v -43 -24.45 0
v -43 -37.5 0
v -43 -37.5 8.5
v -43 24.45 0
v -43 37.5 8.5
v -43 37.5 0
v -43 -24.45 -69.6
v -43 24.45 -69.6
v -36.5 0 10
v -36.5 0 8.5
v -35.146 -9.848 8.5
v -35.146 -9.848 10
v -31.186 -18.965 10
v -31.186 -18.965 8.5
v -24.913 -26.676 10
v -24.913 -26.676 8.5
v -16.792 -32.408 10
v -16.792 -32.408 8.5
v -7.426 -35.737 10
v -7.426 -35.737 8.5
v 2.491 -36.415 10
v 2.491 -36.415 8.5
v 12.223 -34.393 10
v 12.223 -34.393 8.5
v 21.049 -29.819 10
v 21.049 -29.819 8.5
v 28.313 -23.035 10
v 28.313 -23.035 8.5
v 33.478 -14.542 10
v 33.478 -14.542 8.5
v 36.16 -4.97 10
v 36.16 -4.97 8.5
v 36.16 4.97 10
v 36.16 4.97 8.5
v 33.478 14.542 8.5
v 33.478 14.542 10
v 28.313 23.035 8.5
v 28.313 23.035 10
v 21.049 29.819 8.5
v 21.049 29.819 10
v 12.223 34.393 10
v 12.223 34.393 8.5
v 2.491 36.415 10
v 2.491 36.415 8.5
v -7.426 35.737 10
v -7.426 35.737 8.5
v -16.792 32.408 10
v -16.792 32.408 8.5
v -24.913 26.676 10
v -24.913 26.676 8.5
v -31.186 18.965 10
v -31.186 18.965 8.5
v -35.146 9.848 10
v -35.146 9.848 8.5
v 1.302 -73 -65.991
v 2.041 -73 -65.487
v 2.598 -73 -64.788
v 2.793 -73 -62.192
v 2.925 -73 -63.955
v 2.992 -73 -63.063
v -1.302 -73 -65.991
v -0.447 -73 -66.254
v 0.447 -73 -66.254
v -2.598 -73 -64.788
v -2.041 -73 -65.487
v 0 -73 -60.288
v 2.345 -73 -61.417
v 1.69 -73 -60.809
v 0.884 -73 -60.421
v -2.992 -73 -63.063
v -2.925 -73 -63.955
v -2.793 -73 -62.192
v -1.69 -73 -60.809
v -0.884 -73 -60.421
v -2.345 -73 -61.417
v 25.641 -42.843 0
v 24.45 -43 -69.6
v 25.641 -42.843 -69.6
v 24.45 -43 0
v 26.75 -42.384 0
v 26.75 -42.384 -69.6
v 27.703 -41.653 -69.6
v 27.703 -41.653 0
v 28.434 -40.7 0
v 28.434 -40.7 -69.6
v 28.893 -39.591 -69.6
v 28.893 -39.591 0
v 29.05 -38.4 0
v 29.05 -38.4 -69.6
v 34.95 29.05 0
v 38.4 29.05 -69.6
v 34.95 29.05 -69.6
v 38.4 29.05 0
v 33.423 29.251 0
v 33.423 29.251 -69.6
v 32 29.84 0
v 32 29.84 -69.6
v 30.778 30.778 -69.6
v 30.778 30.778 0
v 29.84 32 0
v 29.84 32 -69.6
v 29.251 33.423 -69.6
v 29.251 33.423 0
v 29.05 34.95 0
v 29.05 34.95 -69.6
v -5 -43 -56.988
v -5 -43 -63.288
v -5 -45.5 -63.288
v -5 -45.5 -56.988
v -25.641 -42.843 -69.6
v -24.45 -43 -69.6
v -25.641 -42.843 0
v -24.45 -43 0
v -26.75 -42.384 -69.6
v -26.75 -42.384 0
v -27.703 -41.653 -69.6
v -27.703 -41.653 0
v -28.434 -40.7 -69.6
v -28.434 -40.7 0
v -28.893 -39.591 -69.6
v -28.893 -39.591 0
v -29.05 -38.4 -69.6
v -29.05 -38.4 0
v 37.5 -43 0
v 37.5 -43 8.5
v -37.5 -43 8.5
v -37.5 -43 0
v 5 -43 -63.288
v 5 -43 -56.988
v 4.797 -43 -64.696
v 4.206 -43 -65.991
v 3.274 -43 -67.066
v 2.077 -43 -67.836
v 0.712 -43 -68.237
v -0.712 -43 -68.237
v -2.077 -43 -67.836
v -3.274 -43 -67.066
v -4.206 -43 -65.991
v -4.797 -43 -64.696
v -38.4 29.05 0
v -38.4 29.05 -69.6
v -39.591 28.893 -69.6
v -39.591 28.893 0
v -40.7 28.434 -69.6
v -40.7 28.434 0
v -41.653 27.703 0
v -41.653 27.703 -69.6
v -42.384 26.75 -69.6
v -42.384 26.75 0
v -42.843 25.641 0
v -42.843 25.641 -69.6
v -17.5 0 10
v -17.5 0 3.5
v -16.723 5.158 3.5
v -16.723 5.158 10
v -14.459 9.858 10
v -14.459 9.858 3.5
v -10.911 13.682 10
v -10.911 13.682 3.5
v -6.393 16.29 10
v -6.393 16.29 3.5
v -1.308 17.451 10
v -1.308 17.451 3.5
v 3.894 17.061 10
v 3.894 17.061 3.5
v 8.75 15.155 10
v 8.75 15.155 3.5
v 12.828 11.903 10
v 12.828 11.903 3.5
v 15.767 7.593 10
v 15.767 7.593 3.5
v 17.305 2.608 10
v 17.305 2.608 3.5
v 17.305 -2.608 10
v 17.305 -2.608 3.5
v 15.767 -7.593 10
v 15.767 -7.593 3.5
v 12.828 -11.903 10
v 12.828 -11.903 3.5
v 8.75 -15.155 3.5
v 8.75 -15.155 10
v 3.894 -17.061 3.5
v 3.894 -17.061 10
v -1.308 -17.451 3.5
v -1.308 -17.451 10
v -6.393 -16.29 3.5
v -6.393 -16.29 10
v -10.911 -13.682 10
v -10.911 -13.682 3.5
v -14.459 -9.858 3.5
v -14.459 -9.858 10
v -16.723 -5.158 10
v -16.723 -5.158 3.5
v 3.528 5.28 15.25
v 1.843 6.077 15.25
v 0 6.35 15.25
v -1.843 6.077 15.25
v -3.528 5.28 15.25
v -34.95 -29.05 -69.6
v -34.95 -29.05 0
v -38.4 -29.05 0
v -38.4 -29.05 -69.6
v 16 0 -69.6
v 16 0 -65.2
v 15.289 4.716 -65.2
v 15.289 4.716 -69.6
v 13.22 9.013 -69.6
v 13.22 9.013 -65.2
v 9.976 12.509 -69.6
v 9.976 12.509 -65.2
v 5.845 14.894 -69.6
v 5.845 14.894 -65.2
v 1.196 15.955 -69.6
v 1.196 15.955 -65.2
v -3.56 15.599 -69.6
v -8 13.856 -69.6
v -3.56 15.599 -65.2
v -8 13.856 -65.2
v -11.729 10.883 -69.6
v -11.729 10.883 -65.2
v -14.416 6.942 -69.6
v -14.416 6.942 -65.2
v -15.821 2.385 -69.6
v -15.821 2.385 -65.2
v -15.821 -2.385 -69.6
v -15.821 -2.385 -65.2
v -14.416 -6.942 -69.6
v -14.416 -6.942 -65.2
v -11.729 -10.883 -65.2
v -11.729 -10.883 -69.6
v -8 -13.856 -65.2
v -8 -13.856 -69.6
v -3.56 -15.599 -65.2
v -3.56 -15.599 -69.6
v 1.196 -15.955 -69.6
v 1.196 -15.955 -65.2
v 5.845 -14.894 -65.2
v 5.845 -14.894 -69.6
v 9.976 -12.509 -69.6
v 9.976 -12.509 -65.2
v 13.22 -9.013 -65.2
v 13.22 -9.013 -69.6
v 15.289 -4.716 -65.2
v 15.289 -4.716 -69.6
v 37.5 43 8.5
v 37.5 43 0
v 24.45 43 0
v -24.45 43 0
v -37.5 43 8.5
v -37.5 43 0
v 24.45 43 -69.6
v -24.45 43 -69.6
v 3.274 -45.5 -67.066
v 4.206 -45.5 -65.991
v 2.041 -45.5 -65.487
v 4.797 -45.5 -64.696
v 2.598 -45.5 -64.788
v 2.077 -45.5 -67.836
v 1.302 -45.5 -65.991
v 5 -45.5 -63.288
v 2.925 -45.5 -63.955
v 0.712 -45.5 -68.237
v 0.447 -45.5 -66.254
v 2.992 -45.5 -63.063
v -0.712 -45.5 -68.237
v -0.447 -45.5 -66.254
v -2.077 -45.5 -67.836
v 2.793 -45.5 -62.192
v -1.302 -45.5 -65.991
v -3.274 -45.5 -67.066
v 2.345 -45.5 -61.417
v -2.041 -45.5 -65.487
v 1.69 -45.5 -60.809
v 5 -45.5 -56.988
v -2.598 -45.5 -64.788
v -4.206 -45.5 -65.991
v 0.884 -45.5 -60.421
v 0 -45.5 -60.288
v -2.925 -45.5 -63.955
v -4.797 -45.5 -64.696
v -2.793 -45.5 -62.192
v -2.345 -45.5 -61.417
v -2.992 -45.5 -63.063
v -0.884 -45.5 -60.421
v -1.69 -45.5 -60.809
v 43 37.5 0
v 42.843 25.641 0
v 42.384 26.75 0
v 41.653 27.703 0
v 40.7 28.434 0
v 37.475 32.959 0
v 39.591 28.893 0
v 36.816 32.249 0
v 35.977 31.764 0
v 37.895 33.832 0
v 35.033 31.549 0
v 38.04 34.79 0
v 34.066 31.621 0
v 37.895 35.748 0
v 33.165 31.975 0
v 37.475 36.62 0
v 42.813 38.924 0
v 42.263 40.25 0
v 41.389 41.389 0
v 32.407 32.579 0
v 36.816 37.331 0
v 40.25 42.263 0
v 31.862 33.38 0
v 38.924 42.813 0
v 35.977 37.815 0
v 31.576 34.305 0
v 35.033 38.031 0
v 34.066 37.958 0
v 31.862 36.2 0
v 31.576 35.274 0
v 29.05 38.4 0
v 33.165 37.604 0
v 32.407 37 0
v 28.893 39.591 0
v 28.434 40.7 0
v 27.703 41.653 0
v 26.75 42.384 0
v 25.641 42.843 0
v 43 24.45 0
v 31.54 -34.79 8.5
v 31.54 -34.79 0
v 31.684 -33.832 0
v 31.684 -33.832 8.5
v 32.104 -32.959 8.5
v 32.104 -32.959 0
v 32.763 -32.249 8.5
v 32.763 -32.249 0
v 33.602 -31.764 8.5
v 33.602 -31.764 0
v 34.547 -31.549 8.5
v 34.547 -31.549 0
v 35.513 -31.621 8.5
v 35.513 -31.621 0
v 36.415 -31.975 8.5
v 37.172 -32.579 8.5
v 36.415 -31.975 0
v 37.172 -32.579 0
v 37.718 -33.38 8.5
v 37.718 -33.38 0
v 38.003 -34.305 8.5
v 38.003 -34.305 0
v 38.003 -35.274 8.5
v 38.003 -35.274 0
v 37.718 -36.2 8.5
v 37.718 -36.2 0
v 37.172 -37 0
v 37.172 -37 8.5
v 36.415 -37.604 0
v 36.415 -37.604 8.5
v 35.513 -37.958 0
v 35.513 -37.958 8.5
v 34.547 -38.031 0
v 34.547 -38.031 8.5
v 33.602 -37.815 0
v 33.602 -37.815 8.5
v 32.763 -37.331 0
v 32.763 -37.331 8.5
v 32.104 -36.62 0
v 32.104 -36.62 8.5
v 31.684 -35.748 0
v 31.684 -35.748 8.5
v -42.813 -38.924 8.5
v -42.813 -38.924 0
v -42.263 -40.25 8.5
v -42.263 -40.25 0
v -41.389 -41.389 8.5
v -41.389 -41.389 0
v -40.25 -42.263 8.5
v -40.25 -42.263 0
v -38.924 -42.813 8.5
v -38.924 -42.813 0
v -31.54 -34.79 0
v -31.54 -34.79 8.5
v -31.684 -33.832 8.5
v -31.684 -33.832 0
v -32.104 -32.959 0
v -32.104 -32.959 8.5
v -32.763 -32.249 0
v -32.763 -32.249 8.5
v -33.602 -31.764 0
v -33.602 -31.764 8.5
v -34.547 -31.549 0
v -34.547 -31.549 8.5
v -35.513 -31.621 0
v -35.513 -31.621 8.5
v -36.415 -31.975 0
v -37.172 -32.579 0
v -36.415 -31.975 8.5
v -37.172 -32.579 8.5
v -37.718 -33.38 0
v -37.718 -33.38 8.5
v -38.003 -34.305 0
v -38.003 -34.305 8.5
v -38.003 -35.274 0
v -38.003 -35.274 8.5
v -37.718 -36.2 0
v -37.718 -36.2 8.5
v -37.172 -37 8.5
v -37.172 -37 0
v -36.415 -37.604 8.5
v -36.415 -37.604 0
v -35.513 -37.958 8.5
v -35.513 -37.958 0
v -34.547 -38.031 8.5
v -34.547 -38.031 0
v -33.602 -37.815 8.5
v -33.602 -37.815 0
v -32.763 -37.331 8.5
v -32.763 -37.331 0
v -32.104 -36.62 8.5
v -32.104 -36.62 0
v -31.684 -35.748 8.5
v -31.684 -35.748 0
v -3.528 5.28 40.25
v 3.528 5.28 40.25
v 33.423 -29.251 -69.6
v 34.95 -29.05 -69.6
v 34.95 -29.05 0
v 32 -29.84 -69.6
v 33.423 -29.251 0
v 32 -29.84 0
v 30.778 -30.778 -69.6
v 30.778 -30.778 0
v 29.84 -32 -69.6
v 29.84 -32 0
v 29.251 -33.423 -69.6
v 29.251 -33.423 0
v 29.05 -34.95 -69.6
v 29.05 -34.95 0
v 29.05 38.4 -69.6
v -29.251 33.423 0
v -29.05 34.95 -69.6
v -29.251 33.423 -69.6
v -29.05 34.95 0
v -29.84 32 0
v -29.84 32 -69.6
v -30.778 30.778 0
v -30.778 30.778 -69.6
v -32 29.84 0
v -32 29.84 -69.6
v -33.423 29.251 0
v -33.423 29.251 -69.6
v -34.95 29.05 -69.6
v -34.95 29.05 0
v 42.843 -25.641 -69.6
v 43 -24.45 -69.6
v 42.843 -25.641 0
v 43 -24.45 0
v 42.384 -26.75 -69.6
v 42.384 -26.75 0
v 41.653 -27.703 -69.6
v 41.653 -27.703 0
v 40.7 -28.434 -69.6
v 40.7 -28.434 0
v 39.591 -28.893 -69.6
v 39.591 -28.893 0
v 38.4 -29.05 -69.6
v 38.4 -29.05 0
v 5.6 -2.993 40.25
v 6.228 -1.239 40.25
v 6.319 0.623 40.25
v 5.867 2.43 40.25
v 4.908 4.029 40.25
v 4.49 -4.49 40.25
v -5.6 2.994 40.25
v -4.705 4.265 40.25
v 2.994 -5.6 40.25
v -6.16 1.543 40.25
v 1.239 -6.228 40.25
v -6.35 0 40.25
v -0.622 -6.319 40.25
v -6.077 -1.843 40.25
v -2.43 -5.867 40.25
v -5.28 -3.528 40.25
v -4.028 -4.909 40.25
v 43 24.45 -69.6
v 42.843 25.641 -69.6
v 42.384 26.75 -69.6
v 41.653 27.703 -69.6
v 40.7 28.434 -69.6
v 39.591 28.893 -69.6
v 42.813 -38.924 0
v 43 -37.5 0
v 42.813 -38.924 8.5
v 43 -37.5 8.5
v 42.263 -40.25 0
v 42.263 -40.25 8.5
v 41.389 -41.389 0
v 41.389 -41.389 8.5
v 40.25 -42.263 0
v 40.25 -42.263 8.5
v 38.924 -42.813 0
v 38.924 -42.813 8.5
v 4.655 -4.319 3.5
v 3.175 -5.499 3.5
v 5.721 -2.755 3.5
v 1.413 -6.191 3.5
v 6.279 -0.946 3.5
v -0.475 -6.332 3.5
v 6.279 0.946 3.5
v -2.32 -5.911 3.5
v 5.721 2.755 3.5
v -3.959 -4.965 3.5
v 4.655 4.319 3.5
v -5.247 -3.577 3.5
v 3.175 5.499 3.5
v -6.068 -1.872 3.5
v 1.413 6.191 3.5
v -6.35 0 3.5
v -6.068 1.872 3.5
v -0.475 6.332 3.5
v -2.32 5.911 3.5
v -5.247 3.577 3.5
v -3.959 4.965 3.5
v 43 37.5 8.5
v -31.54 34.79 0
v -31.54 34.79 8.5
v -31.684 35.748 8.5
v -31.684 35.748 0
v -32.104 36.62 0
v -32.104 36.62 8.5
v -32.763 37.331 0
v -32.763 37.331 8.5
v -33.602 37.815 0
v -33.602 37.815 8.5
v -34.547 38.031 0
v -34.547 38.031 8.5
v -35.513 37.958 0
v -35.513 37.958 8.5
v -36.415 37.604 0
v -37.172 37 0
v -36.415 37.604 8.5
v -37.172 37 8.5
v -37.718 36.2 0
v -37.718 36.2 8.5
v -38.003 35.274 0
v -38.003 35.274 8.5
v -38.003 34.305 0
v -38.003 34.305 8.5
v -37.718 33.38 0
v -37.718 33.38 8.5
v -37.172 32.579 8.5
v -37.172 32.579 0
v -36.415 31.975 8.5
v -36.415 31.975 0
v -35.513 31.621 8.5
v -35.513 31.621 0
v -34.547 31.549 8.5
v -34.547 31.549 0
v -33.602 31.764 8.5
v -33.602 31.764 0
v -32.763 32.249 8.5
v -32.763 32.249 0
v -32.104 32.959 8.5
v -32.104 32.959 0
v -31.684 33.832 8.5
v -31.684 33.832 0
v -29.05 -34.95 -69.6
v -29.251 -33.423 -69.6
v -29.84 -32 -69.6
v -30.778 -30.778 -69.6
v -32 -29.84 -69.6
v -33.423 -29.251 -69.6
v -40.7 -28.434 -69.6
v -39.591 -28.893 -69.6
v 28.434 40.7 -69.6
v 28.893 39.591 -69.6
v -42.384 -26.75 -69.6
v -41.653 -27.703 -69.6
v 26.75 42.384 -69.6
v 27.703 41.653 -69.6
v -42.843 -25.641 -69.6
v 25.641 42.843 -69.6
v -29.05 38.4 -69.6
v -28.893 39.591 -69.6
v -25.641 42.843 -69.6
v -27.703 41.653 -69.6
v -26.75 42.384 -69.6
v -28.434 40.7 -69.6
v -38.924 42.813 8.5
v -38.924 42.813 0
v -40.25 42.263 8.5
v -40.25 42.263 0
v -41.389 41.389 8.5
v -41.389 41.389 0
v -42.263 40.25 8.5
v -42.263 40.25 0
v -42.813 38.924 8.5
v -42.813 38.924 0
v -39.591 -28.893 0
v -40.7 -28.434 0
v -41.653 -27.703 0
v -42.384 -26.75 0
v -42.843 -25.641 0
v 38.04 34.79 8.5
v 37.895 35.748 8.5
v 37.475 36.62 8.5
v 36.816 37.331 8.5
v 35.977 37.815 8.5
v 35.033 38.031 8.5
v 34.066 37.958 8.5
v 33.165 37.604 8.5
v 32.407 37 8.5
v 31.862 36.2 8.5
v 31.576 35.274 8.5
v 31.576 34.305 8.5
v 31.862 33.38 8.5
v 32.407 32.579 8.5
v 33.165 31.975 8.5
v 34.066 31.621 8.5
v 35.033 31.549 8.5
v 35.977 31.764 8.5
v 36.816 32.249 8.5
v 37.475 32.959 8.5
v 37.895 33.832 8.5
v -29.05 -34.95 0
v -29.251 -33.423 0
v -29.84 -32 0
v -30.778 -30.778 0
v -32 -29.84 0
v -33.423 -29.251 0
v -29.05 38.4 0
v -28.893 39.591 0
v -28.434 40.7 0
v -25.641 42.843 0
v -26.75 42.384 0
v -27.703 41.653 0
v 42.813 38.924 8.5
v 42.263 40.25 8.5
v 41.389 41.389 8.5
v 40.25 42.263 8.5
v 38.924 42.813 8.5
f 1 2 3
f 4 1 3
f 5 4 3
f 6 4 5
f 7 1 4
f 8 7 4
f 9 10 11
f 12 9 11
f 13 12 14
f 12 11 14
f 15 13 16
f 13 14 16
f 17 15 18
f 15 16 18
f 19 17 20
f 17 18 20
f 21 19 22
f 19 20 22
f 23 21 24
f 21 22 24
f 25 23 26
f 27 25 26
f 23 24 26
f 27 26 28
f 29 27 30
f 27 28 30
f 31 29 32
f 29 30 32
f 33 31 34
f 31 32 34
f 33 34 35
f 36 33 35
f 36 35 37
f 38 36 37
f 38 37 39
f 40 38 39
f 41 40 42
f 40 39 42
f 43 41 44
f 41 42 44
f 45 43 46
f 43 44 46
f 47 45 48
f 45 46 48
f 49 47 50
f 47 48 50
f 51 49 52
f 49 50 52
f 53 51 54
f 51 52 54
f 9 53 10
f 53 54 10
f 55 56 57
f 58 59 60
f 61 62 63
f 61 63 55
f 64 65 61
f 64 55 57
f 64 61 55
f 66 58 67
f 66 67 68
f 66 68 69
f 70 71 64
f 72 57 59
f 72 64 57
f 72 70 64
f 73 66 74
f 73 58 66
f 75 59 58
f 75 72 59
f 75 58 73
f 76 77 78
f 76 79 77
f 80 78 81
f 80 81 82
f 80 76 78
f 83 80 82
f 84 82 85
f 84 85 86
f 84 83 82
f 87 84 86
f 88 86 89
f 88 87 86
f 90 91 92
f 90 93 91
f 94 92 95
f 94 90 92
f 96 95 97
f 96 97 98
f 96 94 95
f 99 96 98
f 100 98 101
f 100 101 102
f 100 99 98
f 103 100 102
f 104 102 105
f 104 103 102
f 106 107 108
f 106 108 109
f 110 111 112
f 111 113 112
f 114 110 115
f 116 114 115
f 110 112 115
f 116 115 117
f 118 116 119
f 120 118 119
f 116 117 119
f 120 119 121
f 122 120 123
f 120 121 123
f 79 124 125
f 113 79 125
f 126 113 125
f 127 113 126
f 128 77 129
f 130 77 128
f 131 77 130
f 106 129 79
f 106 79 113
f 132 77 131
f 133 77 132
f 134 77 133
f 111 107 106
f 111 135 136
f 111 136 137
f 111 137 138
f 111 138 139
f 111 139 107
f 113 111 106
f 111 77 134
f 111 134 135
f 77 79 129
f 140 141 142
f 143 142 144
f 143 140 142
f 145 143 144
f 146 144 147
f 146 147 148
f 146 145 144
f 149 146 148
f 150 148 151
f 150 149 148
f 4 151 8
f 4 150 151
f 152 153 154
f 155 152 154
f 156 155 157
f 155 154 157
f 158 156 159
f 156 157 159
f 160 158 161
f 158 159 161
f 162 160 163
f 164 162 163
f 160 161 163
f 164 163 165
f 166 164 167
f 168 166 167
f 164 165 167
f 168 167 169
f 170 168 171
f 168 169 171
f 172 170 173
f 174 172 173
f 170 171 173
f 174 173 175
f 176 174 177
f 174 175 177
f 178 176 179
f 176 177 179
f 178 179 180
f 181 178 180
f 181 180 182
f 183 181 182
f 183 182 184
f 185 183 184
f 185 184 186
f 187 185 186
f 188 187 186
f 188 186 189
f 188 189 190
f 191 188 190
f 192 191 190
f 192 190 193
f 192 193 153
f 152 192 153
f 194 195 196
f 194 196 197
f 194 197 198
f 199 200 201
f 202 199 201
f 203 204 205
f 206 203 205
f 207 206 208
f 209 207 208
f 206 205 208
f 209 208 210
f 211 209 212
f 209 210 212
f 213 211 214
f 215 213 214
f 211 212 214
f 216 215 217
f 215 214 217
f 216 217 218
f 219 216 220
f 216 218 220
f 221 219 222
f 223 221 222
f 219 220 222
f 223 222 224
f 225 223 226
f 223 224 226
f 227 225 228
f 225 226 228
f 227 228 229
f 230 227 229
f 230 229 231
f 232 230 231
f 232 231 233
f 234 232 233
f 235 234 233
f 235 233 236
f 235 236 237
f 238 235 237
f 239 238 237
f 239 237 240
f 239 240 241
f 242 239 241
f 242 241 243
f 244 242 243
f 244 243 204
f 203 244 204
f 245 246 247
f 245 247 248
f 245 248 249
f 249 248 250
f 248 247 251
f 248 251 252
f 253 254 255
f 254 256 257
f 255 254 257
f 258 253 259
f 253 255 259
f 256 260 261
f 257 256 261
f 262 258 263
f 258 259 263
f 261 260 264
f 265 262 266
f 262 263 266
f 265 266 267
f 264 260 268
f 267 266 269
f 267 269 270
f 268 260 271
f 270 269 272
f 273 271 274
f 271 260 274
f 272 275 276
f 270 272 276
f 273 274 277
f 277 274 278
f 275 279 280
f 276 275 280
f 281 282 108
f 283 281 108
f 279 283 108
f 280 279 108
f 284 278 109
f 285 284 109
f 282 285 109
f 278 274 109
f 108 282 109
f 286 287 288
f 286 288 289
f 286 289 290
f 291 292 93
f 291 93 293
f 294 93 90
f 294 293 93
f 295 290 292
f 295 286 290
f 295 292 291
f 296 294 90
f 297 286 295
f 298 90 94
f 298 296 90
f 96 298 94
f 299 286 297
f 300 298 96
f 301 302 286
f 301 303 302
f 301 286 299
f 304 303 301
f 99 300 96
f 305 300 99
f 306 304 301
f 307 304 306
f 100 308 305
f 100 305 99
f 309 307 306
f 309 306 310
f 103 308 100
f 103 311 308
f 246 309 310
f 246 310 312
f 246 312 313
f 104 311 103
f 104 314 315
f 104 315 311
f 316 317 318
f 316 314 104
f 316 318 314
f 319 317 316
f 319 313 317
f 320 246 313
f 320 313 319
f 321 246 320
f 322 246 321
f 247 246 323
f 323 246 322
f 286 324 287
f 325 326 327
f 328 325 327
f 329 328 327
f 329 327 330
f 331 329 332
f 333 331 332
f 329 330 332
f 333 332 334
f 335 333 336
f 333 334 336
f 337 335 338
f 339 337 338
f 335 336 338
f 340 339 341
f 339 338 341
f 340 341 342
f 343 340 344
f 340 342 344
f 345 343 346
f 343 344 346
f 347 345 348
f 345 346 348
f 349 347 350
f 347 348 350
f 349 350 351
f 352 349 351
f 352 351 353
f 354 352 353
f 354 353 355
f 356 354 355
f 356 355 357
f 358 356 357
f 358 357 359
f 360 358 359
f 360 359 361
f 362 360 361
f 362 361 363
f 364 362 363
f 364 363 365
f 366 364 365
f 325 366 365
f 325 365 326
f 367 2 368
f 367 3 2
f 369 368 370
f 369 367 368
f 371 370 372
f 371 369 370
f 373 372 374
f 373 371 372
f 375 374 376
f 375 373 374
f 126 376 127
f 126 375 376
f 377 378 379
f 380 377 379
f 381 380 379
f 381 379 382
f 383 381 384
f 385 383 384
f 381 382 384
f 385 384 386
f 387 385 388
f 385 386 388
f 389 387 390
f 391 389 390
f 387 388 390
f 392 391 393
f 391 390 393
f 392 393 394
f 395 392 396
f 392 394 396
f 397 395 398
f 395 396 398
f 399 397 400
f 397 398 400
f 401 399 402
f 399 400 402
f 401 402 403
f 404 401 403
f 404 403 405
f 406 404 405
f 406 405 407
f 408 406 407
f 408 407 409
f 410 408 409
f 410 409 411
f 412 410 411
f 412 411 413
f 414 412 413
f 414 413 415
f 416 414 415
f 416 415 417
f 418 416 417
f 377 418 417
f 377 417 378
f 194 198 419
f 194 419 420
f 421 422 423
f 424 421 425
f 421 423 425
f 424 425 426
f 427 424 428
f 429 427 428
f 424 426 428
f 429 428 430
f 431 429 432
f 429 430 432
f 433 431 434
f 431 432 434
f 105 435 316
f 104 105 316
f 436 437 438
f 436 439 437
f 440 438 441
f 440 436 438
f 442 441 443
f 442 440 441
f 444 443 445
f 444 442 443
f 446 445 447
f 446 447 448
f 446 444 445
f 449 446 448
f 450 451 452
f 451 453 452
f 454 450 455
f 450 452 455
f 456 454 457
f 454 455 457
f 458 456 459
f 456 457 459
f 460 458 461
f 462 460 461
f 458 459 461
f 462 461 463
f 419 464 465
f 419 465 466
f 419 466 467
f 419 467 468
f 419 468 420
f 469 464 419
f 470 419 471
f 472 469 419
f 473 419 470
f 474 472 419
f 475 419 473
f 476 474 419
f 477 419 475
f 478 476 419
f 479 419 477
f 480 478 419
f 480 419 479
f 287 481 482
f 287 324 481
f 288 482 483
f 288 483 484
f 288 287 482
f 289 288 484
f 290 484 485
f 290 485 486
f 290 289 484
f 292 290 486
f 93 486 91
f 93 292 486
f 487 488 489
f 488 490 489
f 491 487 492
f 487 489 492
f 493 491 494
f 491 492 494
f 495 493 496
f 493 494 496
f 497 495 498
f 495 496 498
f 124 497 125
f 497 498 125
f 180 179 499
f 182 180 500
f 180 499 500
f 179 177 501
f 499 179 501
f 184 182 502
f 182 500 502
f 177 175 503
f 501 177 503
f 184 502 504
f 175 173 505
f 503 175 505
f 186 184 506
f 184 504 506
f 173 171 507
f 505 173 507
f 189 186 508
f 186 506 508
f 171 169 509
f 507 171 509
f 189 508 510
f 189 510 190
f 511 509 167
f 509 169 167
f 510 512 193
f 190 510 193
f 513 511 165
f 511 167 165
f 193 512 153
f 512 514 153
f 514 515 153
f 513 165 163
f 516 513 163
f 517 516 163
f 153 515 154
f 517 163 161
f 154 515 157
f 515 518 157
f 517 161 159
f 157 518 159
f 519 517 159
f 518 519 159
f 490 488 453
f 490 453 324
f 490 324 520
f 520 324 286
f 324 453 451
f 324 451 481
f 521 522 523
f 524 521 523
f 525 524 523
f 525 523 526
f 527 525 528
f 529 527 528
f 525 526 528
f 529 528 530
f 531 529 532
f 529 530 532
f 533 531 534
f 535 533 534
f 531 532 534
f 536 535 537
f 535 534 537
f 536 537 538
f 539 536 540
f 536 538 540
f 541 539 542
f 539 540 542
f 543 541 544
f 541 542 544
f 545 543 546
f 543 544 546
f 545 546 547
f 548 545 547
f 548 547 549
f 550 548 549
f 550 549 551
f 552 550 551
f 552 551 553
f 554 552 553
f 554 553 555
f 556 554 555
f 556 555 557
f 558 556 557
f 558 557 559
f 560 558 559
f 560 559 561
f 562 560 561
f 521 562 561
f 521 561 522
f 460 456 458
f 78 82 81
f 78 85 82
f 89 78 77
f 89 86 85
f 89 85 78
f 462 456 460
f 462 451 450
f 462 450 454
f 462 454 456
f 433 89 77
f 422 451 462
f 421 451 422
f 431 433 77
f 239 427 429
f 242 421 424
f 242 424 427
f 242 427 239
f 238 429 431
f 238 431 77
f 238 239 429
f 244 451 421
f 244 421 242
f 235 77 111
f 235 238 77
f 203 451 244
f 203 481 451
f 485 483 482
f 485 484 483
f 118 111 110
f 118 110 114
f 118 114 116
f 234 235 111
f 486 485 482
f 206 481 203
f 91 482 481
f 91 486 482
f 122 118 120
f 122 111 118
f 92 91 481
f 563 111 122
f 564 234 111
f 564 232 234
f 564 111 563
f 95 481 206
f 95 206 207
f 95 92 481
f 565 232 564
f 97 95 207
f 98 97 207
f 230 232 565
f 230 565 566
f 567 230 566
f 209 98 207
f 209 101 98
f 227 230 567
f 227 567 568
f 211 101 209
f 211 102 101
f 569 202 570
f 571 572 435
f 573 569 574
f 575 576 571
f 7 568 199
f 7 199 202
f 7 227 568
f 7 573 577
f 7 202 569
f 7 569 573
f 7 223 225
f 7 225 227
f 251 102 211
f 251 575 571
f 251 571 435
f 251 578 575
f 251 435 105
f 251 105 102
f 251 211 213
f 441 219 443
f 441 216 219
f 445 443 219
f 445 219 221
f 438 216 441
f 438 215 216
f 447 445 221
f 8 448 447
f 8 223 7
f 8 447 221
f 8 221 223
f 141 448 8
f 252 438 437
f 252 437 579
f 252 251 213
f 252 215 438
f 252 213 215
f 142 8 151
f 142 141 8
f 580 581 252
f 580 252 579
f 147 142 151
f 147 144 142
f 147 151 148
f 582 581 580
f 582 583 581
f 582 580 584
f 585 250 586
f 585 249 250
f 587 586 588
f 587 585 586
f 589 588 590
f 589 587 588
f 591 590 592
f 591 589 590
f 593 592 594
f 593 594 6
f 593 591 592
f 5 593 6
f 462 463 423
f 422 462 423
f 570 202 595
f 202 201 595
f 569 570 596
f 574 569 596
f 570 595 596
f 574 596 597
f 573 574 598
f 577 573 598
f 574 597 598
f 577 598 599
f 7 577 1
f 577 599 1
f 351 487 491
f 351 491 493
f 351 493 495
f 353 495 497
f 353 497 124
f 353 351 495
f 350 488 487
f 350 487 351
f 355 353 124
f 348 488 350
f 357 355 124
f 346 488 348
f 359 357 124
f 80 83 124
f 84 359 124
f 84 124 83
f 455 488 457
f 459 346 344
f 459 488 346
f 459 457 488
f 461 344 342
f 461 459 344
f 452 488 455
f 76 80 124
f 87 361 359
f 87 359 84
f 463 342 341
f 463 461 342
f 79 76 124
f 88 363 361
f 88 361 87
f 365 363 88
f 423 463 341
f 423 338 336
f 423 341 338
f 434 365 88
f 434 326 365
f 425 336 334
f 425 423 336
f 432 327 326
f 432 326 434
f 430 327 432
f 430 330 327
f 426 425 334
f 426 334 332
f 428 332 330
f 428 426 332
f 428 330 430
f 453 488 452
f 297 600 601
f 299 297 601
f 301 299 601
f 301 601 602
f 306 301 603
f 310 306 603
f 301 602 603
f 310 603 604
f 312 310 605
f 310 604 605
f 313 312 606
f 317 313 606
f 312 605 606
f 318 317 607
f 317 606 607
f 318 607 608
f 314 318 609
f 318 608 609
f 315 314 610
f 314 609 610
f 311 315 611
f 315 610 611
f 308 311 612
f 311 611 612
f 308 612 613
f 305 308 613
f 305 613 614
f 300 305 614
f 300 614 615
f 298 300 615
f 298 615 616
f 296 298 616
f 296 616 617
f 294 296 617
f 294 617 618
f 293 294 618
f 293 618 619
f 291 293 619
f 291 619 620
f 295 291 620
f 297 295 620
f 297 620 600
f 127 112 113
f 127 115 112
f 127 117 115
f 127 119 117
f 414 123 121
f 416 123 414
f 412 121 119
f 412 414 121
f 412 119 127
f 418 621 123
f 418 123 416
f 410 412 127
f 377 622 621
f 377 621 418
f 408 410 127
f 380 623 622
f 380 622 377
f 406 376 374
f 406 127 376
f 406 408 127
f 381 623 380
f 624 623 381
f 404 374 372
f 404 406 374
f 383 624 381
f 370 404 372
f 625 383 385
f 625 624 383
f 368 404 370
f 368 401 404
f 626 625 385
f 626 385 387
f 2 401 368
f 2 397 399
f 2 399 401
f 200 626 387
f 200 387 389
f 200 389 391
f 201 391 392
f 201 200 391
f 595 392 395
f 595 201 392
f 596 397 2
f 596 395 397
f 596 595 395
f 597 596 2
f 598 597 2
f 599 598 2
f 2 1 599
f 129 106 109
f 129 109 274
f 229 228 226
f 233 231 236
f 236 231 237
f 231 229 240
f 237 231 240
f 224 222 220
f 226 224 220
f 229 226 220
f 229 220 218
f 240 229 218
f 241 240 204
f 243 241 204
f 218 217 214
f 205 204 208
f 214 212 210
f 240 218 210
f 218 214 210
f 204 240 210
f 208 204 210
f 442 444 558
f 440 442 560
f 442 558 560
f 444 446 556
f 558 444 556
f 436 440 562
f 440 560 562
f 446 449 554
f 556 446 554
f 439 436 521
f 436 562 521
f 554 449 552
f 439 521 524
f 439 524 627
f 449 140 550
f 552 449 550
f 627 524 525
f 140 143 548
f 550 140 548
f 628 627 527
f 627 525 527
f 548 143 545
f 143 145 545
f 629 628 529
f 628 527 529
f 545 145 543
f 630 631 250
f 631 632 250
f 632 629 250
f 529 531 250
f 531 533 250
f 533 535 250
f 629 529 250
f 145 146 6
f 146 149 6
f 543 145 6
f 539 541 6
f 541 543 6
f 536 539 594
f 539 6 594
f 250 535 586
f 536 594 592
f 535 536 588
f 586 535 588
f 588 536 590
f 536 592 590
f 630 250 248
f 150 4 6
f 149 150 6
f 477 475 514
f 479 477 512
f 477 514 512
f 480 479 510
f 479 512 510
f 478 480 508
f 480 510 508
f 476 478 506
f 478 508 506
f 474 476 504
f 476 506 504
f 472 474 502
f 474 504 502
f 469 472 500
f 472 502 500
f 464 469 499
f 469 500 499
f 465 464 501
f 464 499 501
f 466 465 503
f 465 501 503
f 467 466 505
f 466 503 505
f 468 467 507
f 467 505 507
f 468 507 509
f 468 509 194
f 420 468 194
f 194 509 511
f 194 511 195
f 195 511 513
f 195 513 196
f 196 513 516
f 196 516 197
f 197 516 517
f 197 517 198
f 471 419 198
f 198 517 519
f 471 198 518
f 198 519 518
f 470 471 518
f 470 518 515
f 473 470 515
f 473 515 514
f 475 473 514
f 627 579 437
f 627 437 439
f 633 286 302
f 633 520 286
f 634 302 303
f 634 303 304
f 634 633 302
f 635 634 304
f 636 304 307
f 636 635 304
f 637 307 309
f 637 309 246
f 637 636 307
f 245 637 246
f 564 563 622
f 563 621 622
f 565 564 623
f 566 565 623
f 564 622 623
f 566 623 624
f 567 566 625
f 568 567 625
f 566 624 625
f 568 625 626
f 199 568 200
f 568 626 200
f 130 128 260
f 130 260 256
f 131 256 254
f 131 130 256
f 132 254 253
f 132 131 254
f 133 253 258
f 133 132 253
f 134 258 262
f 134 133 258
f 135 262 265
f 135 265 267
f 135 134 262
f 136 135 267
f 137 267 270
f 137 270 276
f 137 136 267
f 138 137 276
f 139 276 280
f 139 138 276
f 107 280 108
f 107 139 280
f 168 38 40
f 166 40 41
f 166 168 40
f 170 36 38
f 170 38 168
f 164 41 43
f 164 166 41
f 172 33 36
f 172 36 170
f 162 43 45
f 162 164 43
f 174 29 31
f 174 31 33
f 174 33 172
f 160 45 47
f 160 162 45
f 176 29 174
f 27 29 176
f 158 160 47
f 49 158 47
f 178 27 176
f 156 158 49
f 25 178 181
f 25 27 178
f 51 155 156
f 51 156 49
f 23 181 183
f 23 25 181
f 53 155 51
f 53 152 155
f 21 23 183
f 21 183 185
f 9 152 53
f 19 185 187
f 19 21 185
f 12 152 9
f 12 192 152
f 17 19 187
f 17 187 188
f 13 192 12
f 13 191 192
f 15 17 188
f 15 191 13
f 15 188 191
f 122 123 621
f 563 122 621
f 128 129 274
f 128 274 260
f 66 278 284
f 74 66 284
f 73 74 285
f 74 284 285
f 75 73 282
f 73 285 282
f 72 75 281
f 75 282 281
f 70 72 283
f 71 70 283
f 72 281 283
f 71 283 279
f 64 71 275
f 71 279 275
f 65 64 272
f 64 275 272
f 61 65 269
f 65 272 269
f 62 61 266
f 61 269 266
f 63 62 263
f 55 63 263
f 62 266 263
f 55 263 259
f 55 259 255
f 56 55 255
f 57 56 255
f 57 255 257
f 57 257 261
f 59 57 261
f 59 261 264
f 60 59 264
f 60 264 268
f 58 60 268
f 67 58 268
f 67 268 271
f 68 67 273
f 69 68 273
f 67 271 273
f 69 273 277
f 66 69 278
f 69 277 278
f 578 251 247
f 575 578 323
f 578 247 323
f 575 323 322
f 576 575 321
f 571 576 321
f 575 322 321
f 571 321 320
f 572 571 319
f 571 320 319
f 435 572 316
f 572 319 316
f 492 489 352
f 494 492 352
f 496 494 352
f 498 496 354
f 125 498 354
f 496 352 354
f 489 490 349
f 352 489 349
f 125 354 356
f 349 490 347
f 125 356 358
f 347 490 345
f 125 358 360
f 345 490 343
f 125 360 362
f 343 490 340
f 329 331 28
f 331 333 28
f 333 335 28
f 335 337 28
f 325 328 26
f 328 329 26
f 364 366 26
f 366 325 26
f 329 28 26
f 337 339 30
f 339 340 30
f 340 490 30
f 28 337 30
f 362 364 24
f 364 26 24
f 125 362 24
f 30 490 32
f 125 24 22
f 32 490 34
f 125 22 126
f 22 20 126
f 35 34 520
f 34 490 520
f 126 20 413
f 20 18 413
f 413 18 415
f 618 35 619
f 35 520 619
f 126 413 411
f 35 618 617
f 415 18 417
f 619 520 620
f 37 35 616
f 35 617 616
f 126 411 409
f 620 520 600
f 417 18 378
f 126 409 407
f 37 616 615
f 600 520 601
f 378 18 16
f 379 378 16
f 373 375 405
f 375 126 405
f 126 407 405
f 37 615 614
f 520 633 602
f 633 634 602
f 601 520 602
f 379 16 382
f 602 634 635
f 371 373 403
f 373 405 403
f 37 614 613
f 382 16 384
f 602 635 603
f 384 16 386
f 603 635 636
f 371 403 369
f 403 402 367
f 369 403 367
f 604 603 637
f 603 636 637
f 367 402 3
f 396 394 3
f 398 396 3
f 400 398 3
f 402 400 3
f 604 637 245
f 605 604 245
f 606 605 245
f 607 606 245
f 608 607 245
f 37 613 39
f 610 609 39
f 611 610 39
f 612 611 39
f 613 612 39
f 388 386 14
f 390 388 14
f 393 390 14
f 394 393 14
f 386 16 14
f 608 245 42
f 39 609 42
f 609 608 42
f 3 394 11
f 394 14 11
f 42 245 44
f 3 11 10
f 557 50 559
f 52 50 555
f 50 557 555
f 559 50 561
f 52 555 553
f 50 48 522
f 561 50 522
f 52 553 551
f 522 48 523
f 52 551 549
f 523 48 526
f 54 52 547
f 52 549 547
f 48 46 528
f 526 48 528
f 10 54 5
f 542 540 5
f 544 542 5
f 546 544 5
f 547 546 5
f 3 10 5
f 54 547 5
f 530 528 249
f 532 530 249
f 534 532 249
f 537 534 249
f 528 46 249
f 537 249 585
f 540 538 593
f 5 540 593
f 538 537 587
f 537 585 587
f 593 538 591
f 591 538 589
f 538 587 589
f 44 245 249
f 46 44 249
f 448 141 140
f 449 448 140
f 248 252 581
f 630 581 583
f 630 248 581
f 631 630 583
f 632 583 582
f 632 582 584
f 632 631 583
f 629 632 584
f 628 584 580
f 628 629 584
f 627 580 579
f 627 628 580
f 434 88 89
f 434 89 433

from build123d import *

# Parameters (mm, degrees)
SKETCH_1_W                  = 86
SKETCH_1_H                  = 86
EXTRUDE_1_DEPTH             = 78.1
SKETCH_2_R                  = 36.5
EXTRUDE_2_DEPTH             = 1.5
HOLE_WIZARD_M30_1_D         = 35
HOLE_WIZARD_M30_1_DEPTH     = 6.5
SKETCH_5_R                  = 6.35
EXTRUDE_3_DEPTH             = 36.75
CUT_EXTRUDE_START           = -25
CUT_EXTRUDE_1_DEPTH         = 25
SKETCH_7_W                  = 69.6
SKETCH_7_H                  = 13.95
CUT_EXTRUDE_2_DEPTH         = 13.95
SKETCH_8_W                  = 13.95
SKETCH_8_H                  = 69.6
CUT_EXTRUDE_3_DEPTH         = 13.95
SKETCH_9_W                  = 13.95
SKETCH_9_H                  = 13.95
CUT_EXTRUDE_4_DEPTH         = 69.6
SKETCH_10_W                 = 13.95
SKETCH_10_H                 = 13.95
CUT_EXTRUDE_5_DEPTH         = 69.6
EXTRUDE_4_DEPTH             = 2.5
SKETCH_12_R                 = 3
EXTRUDE_5_DEPTH             = 27.5
HOLE_WIZARD_6_5_6_5_1_D     = 6.5
HOLE_WIZARD_6_5_6_5_1_DEPTH = 78.1
HOLE_WIZARD_6_5_6_5_2_D     = 6.5
HOLE_WIZARD_6_5_6_5_2_DEPTH = 40.25
HOLE_WIZARD_M27_1_D         = 32
HOLE_WIZARD_M27_1_DEPTH     = 4.4
FILLET_1_R                  = 4.6
FILLET_2_R                  = 5.5
FILLET_3_R                  = 5.9


with BuildPart() as part:
    # 草图1 → 凸台-拉伸1 (new body)
    with BuildSketch(Plane(origin=(0, 0, -69.6), x_dir=(-1, 0, 0), z_dir=(0, 0, -1))):
        Rectangle(SKETCH_1_W, SKETCH_1_H)
    extrude(amount=-EXTRUDE_1_DEPTH)

    # 草图2 → 凸台-拉伸2 (add)
    with BuildSketch(Plane.XY.offset(8.5)):
        with Locations(Location((0, 0, 0), (0, 0, 180))):
            Circle(SKETCH_2_R)
    extrude(amount=EXTRUDE_2_DEPTH)

    # M30 间隙孔1
    with Locations(Plane.XY.offset(10)):
        with Locations((0, 0)):
            Hole(HOLE_WIZARD_M30_1_D / 2, depth=HOLE_WIZARD_M30_1_DEPTH)

    # 草图5 → 凸台-拉伸3 (add)
    with BuildSketch(Plane.XY.offset(3.5)):
        with Locations(Location((0, 0, 0), (0, 0, 180))):
            Circle(SKETCH_5_R)
    extrude(amount=EXTRUDE_3_DEPTH)

    # 草图6 → 切除-拉伸1 (cut)
    with BuildSketch(Plane.XY.offset(40.25).offset(CUT_EXTRUDE_START)):
        with BuildLine():
            Line((-3.527619594, 5.28), (3.527619595, 5.28))
            ThreePointArc((3.527619595, 5.28), (1e-09, 6.35), (-3.527619594, 5.28))
        make_face()
    extrude(amount=CUT_EXTRUDE_1_DEPTH, mode=Mode.SUBTRACT)

    # 草图7 → 切除-拉伸2 (cut)
    with BuildSketch(Plane.ZY.offset(43)):
        with Locations((-34.8, 36.025)):
            Rectangle(SKETCH_7_W, SKETCH_7_H)
    extrude(amount=-CUT_EXTRUDE_2_DEPTH, mode=Mode.SUBTRACT)

    # 草图8 → 切除-拉伸3 (cut)
    with BuildSketch(Plane(origin=(0, 43, 0), x_dir=(-1, 0, 0), z_dir=(0, 1, 0))):
        with Locations((-36.025, -34.8)):
            Rectangle(SKETCH_8_W, SKETCH_8_H)
    extrude(amount=-CUT_EXTRUDE_3_DEPTH, mode=Mode.SUBTRACT)

    # 草图9 → 切除-拉伸4 (cut)
    with BuildSketch(Plane(origin=(0, 0, -69.6), x_dir=(-1, 0, 0), z_dir=(0, 0, -1))):
        with Locations((36.025, -36.025)):
            Rectangle(SKETCH_9_W, SKETCH_9_H)
    extrude(amount=-CUT_EXTRUDE_4_DEPTH, mode=Mode.SUBTRACT)

    # 草图10 → 切除-拉伸5 (cut)
    with BuildSketch(Plane(origin=(0, 0, -69.6), x_dir=(-1, 0, 0), z_dir=(0, 0, -1))):
        with Locations((-36.025, -36.025)):
            Rectangle(SKETCH_10_W, SKETCH_10_H)
    extrude(amount=-CUT_EXTRUDE_5_DEPTH, mode=Mode.SUBTRACT)

    # 草图11 → 凸台-拉伸4 (add)
    with BuildSketch(Plane.XZ.offset(43)):
        with BuildLine():
            Line((-5, -56.987641526), (5, -56.987641526))
            Line((5, -56.987641526), (5, -63.287641526))
            ThreePointArc((5, -63.287641526), (0, -68.287641526), (-5, -63.287641526))
            Line((-5, -63.287641526), (-5, -56.987641526))
        make_face()
    extrude(amount=EXTRUDE_4_DEPTH)

    # 草图12 → 凸台-拉伸5 (add)
    with BuildSketch(Plane.XZ.offset(45.5)):
        with Locations(Location((0, -63.287641526, 0), (0, 0, 90))):
            Circle(SKETCH_12_R)
    extrude(amount=EXTRUDE_5_DEPTH)

    # Ø6.5 (6.5) 直径孔1
    with Locations(Plane.XY.offset(8.5)):
        with Locations((34.789653634, -34.789653634)):
            Hole(HOLE_WIZARD_6_5_6_5_1_D / 2, depth=HOLE_WIZARD_6_5_6_5_1_DEPTH)

    # Ø6.5 (6.5) 直径孔2
    with Locations(Plane(origin=(0, 0, 0), x_dir=(-1, 0, 0), z_dir=(0, 0, -1))):
        with Locations((34.789653634, -34.789653634), (-34.789653634, 34.789653634), (34.789653634, 34.789653634)):
            Hole(HOLE_WIZARD_6_5_6_5_2_D / 2, depth=HOLE_WIZARD_6_5_6_5_2_DEPTH)

    # M27 间隙孔1
    with Locations(Plane(origin=(0, 0, -69.6), x_dir=(-1, 0, 0), z_dir=(0, 0, -1))):
        with Locations((0, 0)):
            Hole(HOLE_WIZARD_M27_1_D / 2, depth=HOLE_WIZARD_M27_1_DEPTH)

    # 圆角1
    fillet_1_edges = [part.edges().sort_by_distance(p)[0] for p in [
        (-29.05, 43, -34.8),
        (-43, 29.05, -34.8),
        (43, 29.05, -34.8),
        (29.05, 43, -34.8),
        (-43, -29.05, -34.8),
        (-29.05, -43, -34.8),
        (29.05, -43, -34.8),
        (43, -29.05, -34.8),
    ]]
    fillet(fillet_1_edges, radius=FILLET_1_R)

    # 圆角2
    fillet_2_edges = [part.edges().sort_by_distance(p)[0] for p in [
        (-43, -43, 4.25),
        (43, -43, 4.25),
        (43, 43, 4.25),
        (-43, 43, 4.25),
    ]]
    fillet(fillet_2_edges, radius=FILLET_2_R)

    # 圆角3
    fillet_3_edges = [part.edges().sort_by_distance(p)[0] for p in [
        (-29.05, 29.05, -34.8),
        (29.05, 29.05, -34.8),
        (-29.05, -29.05, -34.8),
        (29.05, -29.05, -34.8),
    ]]
    fillet(fillet_3_edges, radius=FILLET_3_R)


solid = part.part
